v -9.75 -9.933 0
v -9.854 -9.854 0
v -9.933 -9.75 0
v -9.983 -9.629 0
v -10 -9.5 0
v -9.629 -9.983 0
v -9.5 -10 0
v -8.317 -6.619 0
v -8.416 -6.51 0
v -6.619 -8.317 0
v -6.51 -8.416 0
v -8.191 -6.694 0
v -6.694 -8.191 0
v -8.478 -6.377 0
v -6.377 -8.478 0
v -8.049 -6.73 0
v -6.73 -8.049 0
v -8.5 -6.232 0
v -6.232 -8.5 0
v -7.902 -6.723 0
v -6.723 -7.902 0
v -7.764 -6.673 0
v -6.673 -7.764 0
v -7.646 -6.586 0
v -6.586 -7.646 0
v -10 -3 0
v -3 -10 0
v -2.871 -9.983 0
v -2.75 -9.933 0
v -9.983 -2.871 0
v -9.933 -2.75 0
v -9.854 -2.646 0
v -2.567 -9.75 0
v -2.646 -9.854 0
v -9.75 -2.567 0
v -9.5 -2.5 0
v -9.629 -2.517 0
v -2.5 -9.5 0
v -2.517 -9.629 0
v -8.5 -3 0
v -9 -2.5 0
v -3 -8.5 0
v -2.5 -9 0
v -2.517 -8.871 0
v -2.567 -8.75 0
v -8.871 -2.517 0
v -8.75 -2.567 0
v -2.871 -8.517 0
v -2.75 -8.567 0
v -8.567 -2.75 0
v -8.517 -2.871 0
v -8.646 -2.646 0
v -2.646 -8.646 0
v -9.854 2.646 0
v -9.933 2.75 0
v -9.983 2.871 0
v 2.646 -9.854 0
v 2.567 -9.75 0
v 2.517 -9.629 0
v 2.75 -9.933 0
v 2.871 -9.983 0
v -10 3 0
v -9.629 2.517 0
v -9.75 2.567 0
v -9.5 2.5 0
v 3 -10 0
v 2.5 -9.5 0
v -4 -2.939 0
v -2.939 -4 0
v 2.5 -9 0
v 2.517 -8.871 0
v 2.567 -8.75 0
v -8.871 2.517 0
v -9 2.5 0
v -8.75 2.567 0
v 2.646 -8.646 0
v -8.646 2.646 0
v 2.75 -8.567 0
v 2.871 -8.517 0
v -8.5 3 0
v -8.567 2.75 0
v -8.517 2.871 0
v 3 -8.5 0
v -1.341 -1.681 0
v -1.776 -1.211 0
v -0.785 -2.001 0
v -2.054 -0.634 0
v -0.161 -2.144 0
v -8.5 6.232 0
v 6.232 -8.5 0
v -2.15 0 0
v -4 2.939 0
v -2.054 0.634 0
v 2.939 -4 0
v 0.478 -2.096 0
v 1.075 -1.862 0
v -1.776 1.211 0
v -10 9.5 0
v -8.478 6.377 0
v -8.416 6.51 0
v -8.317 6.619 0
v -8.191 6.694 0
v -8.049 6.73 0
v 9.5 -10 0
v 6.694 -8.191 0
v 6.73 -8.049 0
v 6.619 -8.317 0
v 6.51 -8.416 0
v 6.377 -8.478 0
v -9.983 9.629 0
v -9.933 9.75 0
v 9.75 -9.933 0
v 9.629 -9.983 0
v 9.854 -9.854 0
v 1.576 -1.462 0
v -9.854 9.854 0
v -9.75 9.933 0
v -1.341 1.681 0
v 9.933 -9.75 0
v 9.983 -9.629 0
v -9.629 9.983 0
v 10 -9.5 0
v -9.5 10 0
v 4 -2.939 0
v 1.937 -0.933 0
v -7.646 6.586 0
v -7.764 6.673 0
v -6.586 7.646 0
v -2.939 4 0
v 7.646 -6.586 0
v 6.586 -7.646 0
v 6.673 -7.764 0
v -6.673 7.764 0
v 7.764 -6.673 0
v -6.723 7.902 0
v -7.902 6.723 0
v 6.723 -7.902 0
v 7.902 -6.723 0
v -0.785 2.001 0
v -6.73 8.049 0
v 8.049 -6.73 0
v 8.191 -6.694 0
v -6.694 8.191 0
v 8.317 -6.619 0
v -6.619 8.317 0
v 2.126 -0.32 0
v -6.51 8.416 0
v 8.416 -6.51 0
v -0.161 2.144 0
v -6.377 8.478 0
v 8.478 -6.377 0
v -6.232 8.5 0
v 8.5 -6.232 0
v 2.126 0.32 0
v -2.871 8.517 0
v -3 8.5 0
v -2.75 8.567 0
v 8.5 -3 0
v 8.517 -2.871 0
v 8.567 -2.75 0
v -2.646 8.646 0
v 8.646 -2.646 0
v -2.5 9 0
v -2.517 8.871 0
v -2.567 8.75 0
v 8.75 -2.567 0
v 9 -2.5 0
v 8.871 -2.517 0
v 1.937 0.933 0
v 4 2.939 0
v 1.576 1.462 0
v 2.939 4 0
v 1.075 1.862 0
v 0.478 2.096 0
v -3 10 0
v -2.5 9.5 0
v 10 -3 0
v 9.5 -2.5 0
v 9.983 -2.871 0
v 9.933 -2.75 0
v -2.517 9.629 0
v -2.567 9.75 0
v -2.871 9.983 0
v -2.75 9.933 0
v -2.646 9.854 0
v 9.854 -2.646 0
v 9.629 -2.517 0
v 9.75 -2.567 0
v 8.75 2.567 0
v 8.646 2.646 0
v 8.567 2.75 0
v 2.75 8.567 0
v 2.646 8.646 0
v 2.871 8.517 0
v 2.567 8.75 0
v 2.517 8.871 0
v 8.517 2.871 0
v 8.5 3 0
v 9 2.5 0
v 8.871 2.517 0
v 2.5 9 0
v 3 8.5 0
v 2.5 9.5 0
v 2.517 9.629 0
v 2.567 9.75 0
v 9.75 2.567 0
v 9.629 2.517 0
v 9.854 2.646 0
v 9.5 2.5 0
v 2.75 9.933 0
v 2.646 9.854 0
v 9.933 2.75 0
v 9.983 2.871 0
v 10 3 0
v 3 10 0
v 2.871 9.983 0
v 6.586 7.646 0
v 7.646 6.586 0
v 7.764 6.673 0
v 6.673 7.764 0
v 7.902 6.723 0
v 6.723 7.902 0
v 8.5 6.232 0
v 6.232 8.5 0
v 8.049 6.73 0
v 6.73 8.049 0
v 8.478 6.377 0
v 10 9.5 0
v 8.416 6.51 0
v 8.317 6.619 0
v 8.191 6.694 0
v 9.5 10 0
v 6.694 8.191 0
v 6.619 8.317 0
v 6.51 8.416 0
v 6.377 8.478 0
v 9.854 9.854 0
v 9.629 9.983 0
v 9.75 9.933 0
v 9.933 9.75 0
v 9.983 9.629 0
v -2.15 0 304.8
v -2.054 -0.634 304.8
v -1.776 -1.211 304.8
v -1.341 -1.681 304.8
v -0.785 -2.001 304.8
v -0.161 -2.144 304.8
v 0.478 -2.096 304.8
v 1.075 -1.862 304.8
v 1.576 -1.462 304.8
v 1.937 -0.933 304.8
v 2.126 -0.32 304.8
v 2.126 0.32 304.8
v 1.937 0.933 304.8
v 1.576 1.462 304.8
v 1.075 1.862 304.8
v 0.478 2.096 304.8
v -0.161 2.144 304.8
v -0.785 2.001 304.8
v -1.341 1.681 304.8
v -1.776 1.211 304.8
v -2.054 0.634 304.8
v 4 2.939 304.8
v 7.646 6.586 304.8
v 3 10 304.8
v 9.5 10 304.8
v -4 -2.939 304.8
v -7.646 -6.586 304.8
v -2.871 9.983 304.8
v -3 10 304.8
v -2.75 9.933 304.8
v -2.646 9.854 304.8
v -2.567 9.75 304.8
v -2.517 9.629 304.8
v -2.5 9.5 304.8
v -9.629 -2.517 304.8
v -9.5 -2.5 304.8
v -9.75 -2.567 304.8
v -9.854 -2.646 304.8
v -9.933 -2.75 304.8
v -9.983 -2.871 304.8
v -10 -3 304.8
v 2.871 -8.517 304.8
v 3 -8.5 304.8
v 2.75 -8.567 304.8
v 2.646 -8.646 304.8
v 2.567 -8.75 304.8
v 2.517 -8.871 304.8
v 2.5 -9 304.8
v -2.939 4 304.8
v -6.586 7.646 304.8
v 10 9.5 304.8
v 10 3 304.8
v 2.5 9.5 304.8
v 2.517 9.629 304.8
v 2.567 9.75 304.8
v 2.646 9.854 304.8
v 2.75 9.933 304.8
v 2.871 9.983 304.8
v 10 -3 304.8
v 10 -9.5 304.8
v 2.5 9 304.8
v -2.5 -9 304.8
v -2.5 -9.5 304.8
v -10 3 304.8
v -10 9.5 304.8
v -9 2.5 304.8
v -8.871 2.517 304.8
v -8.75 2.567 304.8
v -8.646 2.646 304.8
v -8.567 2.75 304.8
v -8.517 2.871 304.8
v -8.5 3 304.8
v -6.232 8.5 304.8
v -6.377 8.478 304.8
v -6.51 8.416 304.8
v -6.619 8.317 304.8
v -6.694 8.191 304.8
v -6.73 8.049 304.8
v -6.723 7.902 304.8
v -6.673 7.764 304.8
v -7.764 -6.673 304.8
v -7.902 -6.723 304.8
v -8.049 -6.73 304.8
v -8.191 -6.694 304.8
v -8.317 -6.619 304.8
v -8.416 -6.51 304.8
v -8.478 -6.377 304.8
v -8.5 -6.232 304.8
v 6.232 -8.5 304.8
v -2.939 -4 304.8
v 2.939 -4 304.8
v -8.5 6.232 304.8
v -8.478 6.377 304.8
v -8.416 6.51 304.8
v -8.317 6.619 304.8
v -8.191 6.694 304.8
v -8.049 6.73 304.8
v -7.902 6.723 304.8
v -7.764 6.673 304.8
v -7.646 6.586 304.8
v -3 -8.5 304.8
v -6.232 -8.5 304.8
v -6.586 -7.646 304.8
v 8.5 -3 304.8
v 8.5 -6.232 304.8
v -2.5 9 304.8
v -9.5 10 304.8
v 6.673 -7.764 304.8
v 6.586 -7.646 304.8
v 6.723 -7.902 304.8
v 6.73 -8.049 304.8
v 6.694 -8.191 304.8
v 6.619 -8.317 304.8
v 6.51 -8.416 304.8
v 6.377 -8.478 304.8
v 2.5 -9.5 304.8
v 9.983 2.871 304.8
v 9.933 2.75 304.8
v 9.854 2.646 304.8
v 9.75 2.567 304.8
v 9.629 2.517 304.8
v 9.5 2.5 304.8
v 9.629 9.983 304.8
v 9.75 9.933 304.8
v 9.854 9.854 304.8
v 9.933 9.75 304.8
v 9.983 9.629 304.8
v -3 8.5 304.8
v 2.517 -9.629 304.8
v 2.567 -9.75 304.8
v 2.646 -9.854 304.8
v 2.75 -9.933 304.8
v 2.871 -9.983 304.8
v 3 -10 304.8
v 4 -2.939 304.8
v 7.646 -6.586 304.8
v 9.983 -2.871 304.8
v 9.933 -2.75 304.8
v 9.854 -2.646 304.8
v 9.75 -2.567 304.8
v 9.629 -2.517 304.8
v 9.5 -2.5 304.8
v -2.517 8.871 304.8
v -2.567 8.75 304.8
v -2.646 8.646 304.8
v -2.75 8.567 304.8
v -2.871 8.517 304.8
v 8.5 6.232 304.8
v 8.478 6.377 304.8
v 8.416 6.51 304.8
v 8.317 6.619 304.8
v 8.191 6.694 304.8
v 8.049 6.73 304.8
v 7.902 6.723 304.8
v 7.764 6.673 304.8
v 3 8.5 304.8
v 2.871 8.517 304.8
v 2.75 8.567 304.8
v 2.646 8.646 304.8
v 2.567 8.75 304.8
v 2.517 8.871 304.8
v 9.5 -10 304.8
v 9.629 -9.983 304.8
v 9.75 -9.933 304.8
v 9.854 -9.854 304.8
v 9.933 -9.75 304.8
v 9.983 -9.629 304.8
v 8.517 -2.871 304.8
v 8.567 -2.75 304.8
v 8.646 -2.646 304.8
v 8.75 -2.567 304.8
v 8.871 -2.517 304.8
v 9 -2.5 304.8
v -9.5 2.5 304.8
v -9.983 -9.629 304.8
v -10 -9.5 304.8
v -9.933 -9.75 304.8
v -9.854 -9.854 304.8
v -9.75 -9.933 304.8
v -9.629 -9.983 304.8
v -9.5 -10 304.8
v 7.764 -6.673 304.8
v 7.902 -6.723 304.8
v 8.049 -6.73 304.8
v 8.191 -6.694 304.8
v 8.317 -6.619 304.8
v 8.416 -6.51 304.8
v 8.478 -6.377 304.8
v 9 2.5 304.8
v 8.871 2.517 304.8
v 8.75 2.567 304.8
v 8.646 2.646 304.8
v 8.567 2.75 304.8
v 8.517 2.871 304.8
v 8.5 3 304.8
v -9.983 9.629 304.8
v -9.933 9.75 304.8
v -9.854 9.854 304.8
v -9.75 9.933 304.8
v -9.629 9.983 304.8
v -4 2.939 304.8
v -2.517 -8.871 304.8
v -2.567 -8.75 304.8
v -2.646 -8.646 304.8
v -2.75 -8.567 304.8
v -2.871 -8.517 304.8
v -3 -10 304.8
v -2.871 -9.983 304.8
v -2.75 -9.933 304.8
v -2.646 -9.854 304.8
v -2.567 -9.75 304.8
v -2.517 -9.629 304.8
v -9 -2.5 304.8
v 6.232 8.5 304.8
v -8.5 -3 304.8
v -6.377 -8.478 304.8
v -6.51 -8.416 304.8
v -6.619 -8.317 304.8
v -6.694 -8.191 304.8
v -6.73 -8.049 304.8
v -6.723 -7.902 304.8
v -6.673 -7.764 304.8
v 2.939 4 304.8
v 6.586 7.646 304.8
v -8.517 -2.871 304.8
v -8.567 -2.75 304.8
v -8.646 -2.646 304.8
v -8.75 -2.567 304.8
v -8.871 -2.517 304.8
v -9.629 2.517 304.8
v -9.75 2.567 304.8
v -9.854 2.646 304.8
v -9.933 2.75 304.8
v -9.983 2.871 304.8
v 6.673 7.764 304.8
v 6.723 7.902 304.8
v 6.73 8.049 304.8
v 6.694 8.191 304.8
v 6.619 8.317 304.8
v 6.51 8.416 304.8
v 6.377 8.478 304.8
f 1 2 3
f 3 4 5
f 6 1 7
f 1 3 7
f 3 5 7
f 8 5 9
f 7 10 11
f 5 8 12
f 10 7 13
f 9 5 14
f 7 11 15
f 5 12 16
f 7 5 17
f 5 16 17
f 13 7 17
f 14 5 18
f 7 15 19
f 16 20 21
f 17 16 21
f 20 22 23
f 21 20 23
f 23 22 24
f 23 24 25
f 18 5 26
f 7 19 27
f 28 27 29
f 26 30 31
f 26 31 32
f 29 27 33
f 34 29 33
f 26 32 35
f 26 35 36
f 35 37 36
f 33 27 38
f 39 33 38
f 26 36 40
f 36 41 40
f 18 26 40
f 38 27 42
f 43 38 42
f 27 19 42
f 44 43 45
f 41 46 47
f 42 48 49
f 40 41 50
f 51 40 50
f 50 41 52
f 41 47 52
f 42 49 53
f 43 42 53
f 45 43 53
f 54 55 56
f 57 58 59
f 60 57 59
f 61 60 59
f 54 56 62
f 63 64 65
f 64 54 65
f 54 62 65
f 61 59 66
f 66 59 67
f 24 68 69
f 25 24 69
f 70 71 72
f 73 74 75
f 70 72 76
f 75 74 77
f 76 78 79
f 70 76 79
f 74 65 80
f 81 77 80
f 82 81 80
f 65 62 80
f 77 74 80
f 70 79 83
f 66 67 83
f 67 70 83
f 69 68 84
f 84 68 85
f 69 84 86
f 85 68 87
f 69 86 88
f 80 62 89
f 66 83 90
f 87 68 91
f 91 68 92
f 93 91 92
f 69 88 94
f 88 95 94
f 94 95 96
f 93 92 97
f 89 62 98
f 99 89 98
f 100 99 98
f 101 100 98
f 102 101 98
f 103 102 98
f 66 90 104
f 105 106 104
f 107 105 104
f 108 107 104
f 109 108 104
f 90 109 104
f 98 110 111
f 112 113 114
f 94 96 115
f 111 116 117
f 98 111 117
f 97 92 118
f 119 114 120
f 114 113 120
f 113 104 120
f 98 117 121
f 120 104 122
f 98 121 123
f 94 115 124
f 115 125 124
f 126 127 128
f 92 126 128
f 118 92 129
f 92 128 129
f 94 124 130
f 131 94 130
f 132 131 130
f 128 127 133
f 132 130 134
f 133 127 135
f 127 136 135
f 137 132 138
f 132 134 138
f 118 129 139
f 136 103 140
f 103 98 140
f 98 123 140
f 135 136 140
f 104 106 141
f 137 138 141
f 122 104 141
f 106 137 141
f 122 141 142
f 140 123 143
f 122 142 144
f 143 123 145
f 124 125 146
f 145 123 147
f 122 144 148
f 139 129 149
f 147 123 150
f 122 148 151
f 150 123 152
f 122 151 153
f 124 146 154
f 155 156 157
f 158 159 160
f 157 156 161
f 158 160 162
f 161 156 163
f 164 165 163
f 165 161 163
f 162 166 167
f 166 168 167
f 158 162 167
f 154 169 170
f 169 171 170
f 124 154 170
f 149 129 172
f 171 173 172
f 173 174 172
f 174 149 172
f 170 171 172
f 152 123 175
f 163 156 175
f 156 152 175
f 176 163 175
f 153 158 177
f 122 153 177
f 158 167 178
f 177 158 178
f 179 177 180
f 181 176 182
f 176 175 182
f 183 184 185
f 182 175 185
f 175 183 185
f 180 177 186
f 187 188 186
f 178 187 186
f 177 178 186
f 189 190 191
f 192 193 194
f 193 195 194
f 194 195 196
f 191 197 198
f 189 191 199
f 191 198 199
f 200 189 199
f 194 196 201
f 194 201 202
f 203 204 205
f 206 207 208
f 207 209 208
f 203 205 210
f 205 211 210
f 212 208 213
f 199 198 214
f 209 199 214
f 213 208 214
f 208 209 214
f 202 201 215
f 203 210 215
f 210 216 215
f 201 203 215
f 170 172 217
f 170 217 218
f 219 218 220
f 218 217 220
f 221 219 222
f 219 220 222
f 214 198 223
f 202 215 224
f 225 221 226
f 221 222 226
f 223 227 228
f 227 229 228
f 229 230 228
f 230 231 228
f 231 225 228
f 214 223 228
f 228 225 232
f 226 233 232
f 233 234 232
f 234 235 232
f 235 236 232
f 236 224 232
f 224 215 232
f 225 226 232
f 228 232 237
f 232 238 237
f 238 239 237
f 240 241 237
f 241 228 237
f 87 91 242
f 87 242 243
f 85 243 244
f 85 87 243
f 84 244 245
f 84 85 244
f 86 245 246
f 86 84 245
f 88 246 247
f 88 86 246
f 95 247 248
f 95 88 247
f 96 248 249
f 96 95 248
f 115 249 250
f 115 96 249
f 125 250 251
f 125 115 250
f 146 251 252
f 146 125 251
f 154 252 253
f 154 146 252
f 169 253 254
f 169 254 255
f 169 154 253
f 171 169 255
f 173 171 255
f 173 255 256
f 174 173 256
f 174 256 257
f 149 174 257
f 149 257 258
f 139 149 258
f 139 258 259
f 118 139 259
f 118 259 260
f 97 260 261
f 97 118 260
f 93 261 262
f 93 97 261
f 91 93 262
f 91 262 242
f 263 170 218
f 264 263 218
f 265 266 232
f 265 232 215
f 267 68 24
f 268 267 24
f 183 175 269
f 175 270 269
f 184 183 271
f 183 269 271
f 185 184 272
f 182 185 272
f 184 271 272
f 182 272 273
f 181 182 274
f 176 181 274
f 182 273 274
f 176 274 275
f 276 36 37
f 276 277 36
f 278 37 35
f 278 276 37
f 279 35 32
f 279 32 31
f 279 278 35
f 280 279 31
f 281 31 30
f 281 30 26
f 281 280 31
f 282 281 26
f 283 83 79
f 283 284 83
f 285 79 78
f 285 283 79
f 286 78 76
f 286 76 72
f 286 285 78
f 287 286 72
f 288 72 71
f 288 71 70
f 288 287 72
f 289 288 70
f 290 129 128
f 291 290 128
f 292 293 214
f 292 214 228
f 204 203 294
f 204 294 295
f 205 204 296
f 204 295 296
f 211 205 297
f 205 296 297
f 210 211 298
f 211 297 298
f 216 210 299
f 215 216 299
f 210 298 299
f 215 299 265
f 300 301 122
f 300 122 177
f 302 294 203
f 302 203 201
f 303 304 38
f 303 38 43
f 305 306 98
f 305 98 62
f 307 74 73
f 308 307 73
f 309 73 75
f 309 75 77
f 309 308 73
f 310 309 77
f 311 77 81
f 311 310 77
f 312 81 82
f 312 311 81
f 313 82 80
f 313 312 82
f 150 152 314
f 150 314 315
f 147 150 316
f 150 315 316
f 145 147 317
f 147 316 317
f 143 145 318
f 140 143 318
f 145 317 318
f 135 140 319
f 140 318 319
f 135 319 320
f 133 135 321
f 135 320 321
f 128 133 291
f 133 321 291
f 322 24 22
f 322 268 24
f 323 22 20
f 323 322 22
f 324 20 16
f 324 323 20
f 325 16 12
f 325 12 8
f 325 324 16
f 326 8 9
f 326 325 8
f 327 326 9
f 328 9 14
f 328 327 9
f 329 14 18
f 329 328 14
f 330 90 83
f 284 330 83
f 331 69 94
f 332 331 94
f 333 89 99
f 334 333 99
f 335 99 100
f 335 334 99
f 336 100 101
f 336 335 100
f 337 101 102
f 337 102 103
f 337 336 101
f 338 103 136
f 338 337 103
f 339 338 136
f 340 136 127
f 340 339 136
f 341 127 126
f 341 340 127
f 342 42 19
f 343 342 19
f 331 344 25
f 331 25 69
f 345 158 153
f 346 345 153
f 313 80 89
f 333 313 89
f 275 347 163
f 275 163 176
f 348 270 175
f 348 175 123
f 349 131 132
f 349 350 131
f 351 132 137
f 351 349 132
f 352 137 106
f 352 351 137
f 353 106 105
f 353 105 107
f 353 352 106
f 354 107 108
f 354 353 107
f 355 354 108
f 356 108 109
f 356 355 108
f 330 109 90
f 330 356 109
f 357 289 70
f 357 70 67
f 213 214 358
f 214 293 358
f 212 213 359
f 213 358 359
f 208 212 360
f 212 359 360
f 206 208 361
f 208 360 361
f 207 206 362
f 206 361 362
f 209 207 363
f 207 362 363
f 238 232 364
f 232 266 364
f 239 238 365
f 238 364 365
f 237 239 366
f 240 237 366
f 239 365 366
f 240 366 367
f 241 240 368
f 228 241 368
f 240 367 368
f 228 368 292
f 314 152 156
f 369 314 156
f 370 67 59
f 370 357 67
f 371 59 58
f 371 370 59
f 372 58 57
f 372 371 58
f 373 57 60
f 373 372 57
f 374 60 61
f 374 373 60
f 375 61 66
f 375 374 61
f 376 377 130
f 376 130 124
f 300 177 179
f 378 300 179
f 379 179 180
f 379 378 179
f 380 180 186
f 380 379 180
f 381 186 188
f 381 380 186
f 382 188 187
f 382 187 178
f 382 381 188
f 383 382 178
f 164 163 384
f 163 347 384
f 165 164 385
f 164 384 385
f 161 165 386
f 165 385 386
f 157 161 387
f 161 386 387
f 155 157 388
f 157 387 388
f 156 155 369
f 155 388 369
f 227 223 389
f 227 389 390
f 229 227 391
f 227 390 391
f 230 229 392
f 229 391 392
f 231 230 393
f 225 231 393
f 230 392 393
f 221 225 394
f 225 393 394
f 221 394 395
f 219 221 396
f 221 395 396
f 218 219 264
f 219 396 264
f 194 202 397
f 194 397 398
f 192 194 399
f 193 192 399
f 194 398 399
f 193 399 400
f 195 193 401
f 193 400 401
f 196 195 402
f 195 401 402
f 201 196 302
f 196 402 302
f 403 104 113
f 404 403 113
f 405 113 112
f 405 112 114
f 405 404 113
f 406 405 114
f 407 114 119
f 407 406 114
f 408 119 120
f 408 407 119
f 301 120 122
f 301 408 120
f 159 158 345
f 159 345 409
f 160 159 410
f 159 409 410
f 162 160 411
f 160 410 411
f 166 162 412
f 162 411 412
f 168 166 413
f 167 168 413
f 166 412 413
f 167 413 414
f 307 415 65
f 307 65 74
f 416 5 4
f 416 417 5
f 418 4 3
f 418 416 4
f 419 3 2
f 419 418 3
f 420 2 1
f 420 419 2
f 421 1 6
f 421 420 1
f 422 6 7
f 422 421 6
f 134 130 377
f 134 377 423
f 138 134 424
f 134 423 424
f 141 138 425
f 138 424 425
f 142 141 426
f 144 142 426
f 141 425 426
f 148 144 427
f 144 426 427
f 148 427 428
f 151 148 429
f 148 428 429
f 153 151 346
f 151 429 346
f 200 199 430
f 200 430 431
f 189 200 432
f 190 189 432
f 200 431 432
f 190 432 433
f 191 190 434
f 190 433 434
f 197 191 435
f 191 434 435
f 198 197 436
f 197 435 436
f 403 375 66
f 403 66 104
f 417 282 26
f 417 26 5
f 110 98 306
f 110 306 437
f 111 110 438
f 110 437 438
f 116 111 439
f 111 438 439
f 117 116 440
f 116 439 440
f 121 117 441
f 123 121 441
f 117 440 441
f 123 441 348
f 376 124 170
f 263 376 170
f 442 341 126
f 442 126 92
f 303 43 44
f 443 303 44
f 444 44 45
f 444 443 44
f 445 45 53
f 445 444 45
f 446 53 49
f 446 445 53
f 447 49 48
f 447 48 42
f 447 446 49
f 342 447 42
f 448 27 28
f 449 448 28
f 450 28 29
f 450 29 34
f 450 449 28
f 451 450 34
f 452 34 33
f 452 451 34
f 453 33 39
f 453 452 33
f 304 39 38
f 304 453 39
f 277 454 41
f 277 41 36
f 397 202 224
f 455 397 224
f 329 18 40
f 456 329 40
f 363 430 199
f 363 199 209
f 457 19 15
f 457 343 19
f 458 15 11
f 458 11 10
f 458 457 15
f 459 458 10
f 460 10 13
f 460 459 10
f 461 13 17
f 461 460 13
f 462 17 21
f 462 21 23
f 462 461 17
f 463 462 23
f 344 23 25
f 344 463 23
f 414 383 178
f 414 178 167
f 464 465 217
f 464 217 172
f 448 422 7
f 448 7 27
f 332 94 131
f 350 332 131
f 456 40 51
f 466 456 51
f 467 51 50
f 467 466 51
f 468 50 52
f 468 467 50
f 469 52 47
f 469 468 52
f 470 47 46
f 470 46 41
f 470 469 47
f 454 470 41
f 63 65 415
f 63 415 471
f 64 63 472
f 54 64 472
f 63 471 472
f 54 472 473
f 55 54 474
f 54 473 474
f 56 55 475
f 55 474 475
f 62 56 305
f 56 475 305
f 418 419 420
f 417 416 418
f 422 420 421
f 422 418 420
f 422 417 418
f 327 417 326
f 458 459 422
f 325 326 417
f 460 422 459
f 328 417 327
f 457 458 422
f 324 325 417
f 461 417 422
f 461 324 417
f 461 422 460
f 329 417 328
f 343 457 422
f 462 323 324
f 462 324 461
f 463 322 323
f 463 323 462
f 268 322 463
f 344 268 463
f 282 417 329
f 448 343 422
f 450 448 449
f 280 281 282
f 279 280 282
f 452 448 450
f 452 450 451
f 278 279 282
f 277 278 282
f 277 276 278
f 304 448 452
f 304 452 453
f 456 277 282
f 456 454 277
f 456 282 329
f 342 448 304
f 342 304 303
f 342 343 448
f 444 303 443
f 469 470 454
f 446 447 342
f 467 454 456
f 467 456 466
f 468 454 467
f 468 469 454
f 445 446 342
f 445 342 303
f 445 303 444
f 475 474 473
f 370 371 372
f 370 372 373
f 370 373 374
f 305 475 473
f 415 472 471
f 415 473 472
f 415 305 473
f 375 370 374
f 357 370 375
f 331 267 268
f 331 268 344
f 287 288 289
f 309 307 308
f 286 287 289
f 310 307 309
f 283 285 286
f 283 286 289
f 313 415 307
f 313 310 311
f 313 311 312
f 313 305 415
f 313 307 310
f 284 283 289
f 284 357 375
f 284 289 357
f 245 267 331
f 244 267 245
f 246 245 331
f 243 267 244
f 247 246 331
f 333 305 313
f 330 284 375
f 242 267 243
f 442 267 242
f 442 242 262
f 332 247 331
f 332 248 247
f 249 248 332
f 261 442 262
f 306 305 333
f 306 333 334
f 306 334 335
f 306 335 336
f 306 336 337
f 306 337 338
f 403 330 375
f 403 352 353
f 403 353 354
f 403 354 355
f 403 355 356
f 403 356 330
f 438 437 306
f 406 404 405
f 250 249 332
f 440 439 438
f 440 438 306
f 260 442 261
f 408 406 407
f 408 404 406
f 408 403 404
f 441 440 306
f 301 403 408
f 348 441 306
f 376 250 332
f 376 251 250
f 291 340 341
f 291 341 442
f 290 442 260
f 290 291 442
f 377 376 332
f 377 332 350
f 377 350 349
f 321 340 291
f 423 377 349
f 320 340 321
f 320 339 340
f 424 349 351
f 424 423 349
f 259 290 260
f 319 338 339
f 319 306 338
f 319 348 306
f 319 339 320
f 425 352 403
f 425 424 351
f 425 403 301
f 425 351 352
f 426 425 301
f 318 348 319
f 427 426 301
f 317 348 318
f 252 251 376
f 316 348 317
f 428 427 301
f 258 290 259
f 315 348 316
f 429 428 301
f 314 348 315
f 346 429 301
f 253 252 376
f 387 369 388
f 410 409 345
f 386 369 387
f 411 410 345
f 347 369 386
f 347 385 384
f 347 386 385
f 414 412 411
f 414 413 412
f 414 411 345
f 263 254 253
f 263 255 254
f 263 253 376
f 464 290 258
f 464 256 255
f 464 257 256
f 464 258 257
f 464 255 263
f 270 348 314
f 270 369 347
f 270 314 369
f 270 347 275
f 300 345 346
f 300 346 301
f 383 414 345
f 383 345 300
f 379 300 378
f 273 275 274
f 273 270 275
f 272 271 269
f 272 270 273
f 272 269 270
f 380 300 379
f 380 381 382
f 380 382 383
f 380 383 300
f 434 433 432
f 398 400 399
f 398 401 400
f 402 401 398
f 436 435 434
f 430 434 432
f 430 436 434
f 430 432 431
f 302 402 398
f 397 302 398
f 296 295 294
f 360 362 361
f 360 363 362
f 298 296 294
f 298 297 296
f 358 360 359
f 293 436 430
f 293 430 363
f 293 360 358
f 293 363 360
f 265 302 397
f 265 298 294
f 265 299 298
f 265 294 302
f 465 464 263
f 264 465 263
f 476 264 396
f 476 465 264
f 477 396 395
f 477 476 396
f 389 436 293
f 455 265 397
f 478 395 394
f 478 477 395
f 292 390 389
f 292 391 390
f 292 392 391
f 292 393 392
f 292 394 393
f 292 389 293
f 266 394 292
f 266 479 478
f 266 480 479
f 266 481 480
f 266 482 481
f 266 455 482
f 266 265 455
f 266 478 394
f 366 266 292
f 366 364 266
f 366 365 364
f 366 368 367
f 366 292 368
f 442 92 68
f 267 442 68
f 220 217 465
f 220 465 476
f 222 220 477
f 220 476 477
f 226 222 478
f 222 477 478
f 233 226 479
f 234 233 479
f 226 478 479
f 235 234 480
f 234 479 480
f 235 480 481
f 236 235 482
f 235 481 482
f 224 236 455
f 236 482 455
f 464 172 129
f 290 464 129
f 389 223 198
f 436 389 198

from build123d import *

# Parameters (mm, degrees)
SKETCH1_R           = 2.15
BOSS_EXTRUDE1_DEPTH = 304.8
FILLET1_R           = 0.5


with BuildPart() as part:
    # Sketch1 → Boss-Extrude1 (new body)
    with BuildSketch(Plane.XY):
        Polygon((-10, 2.5), (-8.5, 2.5), (-8.5, 7.439339828), (-4, 2.939339828), (-4, 0), (-4, -2.939339828), (-8.5, -7.439339828), (-8.5, -2.5), (-10, -2.5), (-10, -10), (-2.5, -10), (-2.5, -8.5), (-7.439339828, -8.5), (-2.939339828, -4), (0, -4), (2.939339828, -4), (7.439339828, -8.5), (2.5, -8.5), (2.5, -10), (10, -10), (10, -2.5), (8.5, -2.5), (8.5, -7.439339828), (4, -2.939339828), (4, 0), (4, 2.939339828), (8.5, 7.439339828), (8.5, 2.5), (10, 2.5), (10, 10), (2.5, 10), (2.5, 8.5), (7.439339828, 8.5), (2.939339828, 4), (0, 4), (-2.939339828, 4), (-7.439339828, 8.5), (-2.5, 8.5), (-2.5, 10), (-10, 10), align=None)
        with Locations(Location((0, 0, 0), (0, 0, 180))):
            Circle(SKETCH1_R, mode=Mode.SUBTRACT)
    extrude(amount=BOSS_EXTRUDE1_DEPTH)

    # Fillet1
    fillet1_edges = [part.edges().sort_by_distance(p)[0] for p in [
        (7.439339828, 8.5, 152.4),
        (2.5, 8.5, 152.4),
        (2.5, 10, 152.4),
        (10, 10, 152.4),
        (10, 2.5, 152.4),
        (8.5, 2.5, 152.4),
        (8.5, 7.439339828, 152.4),
        (8.5, -7.439339828, 152.4),
        (8.5, -2.5, 152.4),
        (10, -2.5, 152.4),
        (10, -10, 152.4),
        (2.5, -10, 152.4),
        (2.5, -8.5, 152.4),
        (7.439339828, -8.5, 152.4),
        (-7.439339828, -8.5, 152.4),
        (-2.5, -8.5, 152.4),
        (-2.5, -10, 152.4),
        (-10, -10, 152.4),
        (-10, -2.5, 152.4),
        (-8.5, -2.5, 152.4),
        (-8.5, -7.439339828, 152.4),
        (-8.5, 7.439339828, 152.4),
        (-8.5, 2.5, 152.4),
        (-10, 2.5, 152.4),
        (-10, 10, 152.4),
        (-2.5, 10, 152.4),
        (-2.5, 8.5, 152.4),
        (-7.439339828, 8.5, 152.4),
    ]]
    fillet(fillet1_edges, radius=FILLET1_R)


solid = part.part
